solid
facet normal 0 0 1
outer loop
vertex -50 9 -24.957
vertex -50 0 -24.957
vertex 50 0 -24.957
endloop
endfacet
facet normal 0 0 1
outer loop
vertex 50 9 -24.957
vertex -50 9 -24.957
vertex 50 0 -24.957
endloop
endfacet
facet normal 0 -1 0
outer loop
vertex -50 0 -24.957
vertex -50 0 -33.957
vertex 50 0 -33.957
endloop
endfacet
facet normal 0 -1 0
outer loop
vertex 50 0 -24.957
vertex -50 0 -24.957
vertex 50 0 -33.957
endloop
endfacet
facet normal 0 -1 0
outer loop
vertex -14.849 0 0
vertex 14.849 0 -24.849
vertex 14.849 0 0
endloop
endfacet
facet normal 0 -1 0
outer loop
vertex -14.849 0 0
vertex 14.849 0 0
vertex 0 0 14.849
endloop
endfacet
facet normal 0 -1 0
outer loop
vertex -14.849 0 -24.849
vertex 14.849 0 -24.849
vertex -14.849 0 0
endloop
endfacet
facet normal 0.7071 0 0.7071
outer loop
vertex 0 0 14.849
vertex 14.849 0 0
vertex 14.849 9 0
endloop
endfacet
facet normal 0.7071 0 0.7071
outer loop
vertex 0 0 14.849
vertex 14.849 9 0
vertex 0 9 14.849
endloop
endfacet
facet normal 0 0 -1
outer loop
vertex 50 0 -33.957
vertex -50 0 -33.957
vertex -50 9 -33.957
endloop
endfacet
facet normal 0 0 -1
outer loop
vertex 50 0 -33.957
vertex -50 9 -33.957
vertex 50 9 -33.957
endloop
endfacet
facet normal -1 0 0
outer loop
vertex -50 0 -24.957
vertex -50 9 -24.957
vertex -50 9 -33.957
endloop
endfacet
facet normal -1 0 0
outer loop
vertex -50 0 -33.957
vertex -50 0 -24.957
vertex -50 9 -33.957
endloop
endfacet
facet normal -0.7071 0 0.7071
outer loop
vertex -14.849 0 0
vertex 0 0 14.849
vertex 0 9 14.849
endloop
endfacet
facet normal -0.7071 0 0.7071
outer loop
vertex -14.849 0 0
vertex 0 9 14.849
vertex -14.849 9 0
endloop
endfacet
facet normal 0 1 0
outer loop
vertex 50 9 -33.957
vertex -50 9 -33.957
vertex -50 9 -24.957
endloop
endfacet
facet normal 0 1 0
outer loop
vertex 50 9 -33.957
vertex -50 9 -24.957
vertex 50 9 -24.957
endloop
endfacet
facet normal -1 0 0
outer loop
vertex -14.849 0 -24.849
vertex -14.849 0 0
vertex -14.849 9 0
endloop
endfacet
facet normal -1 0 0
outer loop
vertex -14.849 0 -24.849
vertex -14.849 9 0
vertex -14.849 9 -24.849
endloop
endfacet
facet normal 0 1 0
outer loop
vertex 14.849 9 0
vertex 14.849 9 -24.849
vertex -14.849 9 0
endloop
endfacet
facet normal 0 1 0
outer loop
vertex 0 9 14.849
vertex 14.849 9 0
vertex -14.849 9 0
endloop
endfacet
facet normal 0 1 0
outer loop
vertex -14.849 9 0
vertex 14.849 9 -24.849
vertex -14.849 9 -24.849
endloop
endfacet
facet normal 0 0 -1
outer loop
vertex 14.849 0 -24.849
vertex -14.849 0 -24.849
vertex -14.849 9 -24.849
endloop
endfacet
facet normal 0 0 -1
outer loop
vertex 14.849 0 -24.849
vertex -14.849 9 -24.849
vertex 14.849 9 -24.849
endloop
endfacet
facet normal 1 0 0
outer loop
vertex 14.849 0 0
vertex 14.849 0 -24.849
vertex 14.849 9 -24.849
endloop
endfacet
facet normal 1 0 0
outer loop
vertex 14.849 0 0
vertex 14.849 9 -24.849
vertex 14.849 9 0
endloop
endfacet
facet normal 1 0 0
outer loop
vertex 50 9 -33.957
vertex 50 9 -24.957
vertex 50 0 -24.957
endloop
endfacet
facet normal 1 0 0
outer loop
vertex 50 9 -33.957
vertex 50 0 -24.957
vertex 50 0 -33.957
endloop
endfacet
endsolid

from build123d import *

# Parameters (mm, degrees)
BOSS_EXTRUDE1_DEPTH   = 9
SKETCH1_W             = 100
SKETCH1_H             = 9
BOSS_EXTRUDE1_2_DEPTH = 9


with BuildPart() as part:
    # Sketch1 → Boss-Extrude1 (new body)
    with BuildSketch(Plane(origin=(0, 0, 0), x_dir=(1, 0, 0), z_dir=(0, 1, 0))):
        Polygon((-14.849242405, 0), (-14.849242405, 24.849242405), (14.849242405, 24.849242405), (14.849242405, 0), (0, -14.849242405), align=None)
    extrude(amount=BOSS_EXTRUDE1_DEPTH)


with BuildPart() as body_2:
    # Sketch1 → Boss-Extrude1 2 (new body)
    with BuildSketch(Plane(origin=(0, 0, 0), x_dir=(1, 0, 0), z_dir=(0, 1, 0))):
        with Locations((0, 29.457275469)):
            Rectangle(SKETCH1_W, SKETCH1_H)
    extrude(amount=BOSS_EXTRUDE1_2_DEPTH)


solid = Compound([part.part, body_2.part])
